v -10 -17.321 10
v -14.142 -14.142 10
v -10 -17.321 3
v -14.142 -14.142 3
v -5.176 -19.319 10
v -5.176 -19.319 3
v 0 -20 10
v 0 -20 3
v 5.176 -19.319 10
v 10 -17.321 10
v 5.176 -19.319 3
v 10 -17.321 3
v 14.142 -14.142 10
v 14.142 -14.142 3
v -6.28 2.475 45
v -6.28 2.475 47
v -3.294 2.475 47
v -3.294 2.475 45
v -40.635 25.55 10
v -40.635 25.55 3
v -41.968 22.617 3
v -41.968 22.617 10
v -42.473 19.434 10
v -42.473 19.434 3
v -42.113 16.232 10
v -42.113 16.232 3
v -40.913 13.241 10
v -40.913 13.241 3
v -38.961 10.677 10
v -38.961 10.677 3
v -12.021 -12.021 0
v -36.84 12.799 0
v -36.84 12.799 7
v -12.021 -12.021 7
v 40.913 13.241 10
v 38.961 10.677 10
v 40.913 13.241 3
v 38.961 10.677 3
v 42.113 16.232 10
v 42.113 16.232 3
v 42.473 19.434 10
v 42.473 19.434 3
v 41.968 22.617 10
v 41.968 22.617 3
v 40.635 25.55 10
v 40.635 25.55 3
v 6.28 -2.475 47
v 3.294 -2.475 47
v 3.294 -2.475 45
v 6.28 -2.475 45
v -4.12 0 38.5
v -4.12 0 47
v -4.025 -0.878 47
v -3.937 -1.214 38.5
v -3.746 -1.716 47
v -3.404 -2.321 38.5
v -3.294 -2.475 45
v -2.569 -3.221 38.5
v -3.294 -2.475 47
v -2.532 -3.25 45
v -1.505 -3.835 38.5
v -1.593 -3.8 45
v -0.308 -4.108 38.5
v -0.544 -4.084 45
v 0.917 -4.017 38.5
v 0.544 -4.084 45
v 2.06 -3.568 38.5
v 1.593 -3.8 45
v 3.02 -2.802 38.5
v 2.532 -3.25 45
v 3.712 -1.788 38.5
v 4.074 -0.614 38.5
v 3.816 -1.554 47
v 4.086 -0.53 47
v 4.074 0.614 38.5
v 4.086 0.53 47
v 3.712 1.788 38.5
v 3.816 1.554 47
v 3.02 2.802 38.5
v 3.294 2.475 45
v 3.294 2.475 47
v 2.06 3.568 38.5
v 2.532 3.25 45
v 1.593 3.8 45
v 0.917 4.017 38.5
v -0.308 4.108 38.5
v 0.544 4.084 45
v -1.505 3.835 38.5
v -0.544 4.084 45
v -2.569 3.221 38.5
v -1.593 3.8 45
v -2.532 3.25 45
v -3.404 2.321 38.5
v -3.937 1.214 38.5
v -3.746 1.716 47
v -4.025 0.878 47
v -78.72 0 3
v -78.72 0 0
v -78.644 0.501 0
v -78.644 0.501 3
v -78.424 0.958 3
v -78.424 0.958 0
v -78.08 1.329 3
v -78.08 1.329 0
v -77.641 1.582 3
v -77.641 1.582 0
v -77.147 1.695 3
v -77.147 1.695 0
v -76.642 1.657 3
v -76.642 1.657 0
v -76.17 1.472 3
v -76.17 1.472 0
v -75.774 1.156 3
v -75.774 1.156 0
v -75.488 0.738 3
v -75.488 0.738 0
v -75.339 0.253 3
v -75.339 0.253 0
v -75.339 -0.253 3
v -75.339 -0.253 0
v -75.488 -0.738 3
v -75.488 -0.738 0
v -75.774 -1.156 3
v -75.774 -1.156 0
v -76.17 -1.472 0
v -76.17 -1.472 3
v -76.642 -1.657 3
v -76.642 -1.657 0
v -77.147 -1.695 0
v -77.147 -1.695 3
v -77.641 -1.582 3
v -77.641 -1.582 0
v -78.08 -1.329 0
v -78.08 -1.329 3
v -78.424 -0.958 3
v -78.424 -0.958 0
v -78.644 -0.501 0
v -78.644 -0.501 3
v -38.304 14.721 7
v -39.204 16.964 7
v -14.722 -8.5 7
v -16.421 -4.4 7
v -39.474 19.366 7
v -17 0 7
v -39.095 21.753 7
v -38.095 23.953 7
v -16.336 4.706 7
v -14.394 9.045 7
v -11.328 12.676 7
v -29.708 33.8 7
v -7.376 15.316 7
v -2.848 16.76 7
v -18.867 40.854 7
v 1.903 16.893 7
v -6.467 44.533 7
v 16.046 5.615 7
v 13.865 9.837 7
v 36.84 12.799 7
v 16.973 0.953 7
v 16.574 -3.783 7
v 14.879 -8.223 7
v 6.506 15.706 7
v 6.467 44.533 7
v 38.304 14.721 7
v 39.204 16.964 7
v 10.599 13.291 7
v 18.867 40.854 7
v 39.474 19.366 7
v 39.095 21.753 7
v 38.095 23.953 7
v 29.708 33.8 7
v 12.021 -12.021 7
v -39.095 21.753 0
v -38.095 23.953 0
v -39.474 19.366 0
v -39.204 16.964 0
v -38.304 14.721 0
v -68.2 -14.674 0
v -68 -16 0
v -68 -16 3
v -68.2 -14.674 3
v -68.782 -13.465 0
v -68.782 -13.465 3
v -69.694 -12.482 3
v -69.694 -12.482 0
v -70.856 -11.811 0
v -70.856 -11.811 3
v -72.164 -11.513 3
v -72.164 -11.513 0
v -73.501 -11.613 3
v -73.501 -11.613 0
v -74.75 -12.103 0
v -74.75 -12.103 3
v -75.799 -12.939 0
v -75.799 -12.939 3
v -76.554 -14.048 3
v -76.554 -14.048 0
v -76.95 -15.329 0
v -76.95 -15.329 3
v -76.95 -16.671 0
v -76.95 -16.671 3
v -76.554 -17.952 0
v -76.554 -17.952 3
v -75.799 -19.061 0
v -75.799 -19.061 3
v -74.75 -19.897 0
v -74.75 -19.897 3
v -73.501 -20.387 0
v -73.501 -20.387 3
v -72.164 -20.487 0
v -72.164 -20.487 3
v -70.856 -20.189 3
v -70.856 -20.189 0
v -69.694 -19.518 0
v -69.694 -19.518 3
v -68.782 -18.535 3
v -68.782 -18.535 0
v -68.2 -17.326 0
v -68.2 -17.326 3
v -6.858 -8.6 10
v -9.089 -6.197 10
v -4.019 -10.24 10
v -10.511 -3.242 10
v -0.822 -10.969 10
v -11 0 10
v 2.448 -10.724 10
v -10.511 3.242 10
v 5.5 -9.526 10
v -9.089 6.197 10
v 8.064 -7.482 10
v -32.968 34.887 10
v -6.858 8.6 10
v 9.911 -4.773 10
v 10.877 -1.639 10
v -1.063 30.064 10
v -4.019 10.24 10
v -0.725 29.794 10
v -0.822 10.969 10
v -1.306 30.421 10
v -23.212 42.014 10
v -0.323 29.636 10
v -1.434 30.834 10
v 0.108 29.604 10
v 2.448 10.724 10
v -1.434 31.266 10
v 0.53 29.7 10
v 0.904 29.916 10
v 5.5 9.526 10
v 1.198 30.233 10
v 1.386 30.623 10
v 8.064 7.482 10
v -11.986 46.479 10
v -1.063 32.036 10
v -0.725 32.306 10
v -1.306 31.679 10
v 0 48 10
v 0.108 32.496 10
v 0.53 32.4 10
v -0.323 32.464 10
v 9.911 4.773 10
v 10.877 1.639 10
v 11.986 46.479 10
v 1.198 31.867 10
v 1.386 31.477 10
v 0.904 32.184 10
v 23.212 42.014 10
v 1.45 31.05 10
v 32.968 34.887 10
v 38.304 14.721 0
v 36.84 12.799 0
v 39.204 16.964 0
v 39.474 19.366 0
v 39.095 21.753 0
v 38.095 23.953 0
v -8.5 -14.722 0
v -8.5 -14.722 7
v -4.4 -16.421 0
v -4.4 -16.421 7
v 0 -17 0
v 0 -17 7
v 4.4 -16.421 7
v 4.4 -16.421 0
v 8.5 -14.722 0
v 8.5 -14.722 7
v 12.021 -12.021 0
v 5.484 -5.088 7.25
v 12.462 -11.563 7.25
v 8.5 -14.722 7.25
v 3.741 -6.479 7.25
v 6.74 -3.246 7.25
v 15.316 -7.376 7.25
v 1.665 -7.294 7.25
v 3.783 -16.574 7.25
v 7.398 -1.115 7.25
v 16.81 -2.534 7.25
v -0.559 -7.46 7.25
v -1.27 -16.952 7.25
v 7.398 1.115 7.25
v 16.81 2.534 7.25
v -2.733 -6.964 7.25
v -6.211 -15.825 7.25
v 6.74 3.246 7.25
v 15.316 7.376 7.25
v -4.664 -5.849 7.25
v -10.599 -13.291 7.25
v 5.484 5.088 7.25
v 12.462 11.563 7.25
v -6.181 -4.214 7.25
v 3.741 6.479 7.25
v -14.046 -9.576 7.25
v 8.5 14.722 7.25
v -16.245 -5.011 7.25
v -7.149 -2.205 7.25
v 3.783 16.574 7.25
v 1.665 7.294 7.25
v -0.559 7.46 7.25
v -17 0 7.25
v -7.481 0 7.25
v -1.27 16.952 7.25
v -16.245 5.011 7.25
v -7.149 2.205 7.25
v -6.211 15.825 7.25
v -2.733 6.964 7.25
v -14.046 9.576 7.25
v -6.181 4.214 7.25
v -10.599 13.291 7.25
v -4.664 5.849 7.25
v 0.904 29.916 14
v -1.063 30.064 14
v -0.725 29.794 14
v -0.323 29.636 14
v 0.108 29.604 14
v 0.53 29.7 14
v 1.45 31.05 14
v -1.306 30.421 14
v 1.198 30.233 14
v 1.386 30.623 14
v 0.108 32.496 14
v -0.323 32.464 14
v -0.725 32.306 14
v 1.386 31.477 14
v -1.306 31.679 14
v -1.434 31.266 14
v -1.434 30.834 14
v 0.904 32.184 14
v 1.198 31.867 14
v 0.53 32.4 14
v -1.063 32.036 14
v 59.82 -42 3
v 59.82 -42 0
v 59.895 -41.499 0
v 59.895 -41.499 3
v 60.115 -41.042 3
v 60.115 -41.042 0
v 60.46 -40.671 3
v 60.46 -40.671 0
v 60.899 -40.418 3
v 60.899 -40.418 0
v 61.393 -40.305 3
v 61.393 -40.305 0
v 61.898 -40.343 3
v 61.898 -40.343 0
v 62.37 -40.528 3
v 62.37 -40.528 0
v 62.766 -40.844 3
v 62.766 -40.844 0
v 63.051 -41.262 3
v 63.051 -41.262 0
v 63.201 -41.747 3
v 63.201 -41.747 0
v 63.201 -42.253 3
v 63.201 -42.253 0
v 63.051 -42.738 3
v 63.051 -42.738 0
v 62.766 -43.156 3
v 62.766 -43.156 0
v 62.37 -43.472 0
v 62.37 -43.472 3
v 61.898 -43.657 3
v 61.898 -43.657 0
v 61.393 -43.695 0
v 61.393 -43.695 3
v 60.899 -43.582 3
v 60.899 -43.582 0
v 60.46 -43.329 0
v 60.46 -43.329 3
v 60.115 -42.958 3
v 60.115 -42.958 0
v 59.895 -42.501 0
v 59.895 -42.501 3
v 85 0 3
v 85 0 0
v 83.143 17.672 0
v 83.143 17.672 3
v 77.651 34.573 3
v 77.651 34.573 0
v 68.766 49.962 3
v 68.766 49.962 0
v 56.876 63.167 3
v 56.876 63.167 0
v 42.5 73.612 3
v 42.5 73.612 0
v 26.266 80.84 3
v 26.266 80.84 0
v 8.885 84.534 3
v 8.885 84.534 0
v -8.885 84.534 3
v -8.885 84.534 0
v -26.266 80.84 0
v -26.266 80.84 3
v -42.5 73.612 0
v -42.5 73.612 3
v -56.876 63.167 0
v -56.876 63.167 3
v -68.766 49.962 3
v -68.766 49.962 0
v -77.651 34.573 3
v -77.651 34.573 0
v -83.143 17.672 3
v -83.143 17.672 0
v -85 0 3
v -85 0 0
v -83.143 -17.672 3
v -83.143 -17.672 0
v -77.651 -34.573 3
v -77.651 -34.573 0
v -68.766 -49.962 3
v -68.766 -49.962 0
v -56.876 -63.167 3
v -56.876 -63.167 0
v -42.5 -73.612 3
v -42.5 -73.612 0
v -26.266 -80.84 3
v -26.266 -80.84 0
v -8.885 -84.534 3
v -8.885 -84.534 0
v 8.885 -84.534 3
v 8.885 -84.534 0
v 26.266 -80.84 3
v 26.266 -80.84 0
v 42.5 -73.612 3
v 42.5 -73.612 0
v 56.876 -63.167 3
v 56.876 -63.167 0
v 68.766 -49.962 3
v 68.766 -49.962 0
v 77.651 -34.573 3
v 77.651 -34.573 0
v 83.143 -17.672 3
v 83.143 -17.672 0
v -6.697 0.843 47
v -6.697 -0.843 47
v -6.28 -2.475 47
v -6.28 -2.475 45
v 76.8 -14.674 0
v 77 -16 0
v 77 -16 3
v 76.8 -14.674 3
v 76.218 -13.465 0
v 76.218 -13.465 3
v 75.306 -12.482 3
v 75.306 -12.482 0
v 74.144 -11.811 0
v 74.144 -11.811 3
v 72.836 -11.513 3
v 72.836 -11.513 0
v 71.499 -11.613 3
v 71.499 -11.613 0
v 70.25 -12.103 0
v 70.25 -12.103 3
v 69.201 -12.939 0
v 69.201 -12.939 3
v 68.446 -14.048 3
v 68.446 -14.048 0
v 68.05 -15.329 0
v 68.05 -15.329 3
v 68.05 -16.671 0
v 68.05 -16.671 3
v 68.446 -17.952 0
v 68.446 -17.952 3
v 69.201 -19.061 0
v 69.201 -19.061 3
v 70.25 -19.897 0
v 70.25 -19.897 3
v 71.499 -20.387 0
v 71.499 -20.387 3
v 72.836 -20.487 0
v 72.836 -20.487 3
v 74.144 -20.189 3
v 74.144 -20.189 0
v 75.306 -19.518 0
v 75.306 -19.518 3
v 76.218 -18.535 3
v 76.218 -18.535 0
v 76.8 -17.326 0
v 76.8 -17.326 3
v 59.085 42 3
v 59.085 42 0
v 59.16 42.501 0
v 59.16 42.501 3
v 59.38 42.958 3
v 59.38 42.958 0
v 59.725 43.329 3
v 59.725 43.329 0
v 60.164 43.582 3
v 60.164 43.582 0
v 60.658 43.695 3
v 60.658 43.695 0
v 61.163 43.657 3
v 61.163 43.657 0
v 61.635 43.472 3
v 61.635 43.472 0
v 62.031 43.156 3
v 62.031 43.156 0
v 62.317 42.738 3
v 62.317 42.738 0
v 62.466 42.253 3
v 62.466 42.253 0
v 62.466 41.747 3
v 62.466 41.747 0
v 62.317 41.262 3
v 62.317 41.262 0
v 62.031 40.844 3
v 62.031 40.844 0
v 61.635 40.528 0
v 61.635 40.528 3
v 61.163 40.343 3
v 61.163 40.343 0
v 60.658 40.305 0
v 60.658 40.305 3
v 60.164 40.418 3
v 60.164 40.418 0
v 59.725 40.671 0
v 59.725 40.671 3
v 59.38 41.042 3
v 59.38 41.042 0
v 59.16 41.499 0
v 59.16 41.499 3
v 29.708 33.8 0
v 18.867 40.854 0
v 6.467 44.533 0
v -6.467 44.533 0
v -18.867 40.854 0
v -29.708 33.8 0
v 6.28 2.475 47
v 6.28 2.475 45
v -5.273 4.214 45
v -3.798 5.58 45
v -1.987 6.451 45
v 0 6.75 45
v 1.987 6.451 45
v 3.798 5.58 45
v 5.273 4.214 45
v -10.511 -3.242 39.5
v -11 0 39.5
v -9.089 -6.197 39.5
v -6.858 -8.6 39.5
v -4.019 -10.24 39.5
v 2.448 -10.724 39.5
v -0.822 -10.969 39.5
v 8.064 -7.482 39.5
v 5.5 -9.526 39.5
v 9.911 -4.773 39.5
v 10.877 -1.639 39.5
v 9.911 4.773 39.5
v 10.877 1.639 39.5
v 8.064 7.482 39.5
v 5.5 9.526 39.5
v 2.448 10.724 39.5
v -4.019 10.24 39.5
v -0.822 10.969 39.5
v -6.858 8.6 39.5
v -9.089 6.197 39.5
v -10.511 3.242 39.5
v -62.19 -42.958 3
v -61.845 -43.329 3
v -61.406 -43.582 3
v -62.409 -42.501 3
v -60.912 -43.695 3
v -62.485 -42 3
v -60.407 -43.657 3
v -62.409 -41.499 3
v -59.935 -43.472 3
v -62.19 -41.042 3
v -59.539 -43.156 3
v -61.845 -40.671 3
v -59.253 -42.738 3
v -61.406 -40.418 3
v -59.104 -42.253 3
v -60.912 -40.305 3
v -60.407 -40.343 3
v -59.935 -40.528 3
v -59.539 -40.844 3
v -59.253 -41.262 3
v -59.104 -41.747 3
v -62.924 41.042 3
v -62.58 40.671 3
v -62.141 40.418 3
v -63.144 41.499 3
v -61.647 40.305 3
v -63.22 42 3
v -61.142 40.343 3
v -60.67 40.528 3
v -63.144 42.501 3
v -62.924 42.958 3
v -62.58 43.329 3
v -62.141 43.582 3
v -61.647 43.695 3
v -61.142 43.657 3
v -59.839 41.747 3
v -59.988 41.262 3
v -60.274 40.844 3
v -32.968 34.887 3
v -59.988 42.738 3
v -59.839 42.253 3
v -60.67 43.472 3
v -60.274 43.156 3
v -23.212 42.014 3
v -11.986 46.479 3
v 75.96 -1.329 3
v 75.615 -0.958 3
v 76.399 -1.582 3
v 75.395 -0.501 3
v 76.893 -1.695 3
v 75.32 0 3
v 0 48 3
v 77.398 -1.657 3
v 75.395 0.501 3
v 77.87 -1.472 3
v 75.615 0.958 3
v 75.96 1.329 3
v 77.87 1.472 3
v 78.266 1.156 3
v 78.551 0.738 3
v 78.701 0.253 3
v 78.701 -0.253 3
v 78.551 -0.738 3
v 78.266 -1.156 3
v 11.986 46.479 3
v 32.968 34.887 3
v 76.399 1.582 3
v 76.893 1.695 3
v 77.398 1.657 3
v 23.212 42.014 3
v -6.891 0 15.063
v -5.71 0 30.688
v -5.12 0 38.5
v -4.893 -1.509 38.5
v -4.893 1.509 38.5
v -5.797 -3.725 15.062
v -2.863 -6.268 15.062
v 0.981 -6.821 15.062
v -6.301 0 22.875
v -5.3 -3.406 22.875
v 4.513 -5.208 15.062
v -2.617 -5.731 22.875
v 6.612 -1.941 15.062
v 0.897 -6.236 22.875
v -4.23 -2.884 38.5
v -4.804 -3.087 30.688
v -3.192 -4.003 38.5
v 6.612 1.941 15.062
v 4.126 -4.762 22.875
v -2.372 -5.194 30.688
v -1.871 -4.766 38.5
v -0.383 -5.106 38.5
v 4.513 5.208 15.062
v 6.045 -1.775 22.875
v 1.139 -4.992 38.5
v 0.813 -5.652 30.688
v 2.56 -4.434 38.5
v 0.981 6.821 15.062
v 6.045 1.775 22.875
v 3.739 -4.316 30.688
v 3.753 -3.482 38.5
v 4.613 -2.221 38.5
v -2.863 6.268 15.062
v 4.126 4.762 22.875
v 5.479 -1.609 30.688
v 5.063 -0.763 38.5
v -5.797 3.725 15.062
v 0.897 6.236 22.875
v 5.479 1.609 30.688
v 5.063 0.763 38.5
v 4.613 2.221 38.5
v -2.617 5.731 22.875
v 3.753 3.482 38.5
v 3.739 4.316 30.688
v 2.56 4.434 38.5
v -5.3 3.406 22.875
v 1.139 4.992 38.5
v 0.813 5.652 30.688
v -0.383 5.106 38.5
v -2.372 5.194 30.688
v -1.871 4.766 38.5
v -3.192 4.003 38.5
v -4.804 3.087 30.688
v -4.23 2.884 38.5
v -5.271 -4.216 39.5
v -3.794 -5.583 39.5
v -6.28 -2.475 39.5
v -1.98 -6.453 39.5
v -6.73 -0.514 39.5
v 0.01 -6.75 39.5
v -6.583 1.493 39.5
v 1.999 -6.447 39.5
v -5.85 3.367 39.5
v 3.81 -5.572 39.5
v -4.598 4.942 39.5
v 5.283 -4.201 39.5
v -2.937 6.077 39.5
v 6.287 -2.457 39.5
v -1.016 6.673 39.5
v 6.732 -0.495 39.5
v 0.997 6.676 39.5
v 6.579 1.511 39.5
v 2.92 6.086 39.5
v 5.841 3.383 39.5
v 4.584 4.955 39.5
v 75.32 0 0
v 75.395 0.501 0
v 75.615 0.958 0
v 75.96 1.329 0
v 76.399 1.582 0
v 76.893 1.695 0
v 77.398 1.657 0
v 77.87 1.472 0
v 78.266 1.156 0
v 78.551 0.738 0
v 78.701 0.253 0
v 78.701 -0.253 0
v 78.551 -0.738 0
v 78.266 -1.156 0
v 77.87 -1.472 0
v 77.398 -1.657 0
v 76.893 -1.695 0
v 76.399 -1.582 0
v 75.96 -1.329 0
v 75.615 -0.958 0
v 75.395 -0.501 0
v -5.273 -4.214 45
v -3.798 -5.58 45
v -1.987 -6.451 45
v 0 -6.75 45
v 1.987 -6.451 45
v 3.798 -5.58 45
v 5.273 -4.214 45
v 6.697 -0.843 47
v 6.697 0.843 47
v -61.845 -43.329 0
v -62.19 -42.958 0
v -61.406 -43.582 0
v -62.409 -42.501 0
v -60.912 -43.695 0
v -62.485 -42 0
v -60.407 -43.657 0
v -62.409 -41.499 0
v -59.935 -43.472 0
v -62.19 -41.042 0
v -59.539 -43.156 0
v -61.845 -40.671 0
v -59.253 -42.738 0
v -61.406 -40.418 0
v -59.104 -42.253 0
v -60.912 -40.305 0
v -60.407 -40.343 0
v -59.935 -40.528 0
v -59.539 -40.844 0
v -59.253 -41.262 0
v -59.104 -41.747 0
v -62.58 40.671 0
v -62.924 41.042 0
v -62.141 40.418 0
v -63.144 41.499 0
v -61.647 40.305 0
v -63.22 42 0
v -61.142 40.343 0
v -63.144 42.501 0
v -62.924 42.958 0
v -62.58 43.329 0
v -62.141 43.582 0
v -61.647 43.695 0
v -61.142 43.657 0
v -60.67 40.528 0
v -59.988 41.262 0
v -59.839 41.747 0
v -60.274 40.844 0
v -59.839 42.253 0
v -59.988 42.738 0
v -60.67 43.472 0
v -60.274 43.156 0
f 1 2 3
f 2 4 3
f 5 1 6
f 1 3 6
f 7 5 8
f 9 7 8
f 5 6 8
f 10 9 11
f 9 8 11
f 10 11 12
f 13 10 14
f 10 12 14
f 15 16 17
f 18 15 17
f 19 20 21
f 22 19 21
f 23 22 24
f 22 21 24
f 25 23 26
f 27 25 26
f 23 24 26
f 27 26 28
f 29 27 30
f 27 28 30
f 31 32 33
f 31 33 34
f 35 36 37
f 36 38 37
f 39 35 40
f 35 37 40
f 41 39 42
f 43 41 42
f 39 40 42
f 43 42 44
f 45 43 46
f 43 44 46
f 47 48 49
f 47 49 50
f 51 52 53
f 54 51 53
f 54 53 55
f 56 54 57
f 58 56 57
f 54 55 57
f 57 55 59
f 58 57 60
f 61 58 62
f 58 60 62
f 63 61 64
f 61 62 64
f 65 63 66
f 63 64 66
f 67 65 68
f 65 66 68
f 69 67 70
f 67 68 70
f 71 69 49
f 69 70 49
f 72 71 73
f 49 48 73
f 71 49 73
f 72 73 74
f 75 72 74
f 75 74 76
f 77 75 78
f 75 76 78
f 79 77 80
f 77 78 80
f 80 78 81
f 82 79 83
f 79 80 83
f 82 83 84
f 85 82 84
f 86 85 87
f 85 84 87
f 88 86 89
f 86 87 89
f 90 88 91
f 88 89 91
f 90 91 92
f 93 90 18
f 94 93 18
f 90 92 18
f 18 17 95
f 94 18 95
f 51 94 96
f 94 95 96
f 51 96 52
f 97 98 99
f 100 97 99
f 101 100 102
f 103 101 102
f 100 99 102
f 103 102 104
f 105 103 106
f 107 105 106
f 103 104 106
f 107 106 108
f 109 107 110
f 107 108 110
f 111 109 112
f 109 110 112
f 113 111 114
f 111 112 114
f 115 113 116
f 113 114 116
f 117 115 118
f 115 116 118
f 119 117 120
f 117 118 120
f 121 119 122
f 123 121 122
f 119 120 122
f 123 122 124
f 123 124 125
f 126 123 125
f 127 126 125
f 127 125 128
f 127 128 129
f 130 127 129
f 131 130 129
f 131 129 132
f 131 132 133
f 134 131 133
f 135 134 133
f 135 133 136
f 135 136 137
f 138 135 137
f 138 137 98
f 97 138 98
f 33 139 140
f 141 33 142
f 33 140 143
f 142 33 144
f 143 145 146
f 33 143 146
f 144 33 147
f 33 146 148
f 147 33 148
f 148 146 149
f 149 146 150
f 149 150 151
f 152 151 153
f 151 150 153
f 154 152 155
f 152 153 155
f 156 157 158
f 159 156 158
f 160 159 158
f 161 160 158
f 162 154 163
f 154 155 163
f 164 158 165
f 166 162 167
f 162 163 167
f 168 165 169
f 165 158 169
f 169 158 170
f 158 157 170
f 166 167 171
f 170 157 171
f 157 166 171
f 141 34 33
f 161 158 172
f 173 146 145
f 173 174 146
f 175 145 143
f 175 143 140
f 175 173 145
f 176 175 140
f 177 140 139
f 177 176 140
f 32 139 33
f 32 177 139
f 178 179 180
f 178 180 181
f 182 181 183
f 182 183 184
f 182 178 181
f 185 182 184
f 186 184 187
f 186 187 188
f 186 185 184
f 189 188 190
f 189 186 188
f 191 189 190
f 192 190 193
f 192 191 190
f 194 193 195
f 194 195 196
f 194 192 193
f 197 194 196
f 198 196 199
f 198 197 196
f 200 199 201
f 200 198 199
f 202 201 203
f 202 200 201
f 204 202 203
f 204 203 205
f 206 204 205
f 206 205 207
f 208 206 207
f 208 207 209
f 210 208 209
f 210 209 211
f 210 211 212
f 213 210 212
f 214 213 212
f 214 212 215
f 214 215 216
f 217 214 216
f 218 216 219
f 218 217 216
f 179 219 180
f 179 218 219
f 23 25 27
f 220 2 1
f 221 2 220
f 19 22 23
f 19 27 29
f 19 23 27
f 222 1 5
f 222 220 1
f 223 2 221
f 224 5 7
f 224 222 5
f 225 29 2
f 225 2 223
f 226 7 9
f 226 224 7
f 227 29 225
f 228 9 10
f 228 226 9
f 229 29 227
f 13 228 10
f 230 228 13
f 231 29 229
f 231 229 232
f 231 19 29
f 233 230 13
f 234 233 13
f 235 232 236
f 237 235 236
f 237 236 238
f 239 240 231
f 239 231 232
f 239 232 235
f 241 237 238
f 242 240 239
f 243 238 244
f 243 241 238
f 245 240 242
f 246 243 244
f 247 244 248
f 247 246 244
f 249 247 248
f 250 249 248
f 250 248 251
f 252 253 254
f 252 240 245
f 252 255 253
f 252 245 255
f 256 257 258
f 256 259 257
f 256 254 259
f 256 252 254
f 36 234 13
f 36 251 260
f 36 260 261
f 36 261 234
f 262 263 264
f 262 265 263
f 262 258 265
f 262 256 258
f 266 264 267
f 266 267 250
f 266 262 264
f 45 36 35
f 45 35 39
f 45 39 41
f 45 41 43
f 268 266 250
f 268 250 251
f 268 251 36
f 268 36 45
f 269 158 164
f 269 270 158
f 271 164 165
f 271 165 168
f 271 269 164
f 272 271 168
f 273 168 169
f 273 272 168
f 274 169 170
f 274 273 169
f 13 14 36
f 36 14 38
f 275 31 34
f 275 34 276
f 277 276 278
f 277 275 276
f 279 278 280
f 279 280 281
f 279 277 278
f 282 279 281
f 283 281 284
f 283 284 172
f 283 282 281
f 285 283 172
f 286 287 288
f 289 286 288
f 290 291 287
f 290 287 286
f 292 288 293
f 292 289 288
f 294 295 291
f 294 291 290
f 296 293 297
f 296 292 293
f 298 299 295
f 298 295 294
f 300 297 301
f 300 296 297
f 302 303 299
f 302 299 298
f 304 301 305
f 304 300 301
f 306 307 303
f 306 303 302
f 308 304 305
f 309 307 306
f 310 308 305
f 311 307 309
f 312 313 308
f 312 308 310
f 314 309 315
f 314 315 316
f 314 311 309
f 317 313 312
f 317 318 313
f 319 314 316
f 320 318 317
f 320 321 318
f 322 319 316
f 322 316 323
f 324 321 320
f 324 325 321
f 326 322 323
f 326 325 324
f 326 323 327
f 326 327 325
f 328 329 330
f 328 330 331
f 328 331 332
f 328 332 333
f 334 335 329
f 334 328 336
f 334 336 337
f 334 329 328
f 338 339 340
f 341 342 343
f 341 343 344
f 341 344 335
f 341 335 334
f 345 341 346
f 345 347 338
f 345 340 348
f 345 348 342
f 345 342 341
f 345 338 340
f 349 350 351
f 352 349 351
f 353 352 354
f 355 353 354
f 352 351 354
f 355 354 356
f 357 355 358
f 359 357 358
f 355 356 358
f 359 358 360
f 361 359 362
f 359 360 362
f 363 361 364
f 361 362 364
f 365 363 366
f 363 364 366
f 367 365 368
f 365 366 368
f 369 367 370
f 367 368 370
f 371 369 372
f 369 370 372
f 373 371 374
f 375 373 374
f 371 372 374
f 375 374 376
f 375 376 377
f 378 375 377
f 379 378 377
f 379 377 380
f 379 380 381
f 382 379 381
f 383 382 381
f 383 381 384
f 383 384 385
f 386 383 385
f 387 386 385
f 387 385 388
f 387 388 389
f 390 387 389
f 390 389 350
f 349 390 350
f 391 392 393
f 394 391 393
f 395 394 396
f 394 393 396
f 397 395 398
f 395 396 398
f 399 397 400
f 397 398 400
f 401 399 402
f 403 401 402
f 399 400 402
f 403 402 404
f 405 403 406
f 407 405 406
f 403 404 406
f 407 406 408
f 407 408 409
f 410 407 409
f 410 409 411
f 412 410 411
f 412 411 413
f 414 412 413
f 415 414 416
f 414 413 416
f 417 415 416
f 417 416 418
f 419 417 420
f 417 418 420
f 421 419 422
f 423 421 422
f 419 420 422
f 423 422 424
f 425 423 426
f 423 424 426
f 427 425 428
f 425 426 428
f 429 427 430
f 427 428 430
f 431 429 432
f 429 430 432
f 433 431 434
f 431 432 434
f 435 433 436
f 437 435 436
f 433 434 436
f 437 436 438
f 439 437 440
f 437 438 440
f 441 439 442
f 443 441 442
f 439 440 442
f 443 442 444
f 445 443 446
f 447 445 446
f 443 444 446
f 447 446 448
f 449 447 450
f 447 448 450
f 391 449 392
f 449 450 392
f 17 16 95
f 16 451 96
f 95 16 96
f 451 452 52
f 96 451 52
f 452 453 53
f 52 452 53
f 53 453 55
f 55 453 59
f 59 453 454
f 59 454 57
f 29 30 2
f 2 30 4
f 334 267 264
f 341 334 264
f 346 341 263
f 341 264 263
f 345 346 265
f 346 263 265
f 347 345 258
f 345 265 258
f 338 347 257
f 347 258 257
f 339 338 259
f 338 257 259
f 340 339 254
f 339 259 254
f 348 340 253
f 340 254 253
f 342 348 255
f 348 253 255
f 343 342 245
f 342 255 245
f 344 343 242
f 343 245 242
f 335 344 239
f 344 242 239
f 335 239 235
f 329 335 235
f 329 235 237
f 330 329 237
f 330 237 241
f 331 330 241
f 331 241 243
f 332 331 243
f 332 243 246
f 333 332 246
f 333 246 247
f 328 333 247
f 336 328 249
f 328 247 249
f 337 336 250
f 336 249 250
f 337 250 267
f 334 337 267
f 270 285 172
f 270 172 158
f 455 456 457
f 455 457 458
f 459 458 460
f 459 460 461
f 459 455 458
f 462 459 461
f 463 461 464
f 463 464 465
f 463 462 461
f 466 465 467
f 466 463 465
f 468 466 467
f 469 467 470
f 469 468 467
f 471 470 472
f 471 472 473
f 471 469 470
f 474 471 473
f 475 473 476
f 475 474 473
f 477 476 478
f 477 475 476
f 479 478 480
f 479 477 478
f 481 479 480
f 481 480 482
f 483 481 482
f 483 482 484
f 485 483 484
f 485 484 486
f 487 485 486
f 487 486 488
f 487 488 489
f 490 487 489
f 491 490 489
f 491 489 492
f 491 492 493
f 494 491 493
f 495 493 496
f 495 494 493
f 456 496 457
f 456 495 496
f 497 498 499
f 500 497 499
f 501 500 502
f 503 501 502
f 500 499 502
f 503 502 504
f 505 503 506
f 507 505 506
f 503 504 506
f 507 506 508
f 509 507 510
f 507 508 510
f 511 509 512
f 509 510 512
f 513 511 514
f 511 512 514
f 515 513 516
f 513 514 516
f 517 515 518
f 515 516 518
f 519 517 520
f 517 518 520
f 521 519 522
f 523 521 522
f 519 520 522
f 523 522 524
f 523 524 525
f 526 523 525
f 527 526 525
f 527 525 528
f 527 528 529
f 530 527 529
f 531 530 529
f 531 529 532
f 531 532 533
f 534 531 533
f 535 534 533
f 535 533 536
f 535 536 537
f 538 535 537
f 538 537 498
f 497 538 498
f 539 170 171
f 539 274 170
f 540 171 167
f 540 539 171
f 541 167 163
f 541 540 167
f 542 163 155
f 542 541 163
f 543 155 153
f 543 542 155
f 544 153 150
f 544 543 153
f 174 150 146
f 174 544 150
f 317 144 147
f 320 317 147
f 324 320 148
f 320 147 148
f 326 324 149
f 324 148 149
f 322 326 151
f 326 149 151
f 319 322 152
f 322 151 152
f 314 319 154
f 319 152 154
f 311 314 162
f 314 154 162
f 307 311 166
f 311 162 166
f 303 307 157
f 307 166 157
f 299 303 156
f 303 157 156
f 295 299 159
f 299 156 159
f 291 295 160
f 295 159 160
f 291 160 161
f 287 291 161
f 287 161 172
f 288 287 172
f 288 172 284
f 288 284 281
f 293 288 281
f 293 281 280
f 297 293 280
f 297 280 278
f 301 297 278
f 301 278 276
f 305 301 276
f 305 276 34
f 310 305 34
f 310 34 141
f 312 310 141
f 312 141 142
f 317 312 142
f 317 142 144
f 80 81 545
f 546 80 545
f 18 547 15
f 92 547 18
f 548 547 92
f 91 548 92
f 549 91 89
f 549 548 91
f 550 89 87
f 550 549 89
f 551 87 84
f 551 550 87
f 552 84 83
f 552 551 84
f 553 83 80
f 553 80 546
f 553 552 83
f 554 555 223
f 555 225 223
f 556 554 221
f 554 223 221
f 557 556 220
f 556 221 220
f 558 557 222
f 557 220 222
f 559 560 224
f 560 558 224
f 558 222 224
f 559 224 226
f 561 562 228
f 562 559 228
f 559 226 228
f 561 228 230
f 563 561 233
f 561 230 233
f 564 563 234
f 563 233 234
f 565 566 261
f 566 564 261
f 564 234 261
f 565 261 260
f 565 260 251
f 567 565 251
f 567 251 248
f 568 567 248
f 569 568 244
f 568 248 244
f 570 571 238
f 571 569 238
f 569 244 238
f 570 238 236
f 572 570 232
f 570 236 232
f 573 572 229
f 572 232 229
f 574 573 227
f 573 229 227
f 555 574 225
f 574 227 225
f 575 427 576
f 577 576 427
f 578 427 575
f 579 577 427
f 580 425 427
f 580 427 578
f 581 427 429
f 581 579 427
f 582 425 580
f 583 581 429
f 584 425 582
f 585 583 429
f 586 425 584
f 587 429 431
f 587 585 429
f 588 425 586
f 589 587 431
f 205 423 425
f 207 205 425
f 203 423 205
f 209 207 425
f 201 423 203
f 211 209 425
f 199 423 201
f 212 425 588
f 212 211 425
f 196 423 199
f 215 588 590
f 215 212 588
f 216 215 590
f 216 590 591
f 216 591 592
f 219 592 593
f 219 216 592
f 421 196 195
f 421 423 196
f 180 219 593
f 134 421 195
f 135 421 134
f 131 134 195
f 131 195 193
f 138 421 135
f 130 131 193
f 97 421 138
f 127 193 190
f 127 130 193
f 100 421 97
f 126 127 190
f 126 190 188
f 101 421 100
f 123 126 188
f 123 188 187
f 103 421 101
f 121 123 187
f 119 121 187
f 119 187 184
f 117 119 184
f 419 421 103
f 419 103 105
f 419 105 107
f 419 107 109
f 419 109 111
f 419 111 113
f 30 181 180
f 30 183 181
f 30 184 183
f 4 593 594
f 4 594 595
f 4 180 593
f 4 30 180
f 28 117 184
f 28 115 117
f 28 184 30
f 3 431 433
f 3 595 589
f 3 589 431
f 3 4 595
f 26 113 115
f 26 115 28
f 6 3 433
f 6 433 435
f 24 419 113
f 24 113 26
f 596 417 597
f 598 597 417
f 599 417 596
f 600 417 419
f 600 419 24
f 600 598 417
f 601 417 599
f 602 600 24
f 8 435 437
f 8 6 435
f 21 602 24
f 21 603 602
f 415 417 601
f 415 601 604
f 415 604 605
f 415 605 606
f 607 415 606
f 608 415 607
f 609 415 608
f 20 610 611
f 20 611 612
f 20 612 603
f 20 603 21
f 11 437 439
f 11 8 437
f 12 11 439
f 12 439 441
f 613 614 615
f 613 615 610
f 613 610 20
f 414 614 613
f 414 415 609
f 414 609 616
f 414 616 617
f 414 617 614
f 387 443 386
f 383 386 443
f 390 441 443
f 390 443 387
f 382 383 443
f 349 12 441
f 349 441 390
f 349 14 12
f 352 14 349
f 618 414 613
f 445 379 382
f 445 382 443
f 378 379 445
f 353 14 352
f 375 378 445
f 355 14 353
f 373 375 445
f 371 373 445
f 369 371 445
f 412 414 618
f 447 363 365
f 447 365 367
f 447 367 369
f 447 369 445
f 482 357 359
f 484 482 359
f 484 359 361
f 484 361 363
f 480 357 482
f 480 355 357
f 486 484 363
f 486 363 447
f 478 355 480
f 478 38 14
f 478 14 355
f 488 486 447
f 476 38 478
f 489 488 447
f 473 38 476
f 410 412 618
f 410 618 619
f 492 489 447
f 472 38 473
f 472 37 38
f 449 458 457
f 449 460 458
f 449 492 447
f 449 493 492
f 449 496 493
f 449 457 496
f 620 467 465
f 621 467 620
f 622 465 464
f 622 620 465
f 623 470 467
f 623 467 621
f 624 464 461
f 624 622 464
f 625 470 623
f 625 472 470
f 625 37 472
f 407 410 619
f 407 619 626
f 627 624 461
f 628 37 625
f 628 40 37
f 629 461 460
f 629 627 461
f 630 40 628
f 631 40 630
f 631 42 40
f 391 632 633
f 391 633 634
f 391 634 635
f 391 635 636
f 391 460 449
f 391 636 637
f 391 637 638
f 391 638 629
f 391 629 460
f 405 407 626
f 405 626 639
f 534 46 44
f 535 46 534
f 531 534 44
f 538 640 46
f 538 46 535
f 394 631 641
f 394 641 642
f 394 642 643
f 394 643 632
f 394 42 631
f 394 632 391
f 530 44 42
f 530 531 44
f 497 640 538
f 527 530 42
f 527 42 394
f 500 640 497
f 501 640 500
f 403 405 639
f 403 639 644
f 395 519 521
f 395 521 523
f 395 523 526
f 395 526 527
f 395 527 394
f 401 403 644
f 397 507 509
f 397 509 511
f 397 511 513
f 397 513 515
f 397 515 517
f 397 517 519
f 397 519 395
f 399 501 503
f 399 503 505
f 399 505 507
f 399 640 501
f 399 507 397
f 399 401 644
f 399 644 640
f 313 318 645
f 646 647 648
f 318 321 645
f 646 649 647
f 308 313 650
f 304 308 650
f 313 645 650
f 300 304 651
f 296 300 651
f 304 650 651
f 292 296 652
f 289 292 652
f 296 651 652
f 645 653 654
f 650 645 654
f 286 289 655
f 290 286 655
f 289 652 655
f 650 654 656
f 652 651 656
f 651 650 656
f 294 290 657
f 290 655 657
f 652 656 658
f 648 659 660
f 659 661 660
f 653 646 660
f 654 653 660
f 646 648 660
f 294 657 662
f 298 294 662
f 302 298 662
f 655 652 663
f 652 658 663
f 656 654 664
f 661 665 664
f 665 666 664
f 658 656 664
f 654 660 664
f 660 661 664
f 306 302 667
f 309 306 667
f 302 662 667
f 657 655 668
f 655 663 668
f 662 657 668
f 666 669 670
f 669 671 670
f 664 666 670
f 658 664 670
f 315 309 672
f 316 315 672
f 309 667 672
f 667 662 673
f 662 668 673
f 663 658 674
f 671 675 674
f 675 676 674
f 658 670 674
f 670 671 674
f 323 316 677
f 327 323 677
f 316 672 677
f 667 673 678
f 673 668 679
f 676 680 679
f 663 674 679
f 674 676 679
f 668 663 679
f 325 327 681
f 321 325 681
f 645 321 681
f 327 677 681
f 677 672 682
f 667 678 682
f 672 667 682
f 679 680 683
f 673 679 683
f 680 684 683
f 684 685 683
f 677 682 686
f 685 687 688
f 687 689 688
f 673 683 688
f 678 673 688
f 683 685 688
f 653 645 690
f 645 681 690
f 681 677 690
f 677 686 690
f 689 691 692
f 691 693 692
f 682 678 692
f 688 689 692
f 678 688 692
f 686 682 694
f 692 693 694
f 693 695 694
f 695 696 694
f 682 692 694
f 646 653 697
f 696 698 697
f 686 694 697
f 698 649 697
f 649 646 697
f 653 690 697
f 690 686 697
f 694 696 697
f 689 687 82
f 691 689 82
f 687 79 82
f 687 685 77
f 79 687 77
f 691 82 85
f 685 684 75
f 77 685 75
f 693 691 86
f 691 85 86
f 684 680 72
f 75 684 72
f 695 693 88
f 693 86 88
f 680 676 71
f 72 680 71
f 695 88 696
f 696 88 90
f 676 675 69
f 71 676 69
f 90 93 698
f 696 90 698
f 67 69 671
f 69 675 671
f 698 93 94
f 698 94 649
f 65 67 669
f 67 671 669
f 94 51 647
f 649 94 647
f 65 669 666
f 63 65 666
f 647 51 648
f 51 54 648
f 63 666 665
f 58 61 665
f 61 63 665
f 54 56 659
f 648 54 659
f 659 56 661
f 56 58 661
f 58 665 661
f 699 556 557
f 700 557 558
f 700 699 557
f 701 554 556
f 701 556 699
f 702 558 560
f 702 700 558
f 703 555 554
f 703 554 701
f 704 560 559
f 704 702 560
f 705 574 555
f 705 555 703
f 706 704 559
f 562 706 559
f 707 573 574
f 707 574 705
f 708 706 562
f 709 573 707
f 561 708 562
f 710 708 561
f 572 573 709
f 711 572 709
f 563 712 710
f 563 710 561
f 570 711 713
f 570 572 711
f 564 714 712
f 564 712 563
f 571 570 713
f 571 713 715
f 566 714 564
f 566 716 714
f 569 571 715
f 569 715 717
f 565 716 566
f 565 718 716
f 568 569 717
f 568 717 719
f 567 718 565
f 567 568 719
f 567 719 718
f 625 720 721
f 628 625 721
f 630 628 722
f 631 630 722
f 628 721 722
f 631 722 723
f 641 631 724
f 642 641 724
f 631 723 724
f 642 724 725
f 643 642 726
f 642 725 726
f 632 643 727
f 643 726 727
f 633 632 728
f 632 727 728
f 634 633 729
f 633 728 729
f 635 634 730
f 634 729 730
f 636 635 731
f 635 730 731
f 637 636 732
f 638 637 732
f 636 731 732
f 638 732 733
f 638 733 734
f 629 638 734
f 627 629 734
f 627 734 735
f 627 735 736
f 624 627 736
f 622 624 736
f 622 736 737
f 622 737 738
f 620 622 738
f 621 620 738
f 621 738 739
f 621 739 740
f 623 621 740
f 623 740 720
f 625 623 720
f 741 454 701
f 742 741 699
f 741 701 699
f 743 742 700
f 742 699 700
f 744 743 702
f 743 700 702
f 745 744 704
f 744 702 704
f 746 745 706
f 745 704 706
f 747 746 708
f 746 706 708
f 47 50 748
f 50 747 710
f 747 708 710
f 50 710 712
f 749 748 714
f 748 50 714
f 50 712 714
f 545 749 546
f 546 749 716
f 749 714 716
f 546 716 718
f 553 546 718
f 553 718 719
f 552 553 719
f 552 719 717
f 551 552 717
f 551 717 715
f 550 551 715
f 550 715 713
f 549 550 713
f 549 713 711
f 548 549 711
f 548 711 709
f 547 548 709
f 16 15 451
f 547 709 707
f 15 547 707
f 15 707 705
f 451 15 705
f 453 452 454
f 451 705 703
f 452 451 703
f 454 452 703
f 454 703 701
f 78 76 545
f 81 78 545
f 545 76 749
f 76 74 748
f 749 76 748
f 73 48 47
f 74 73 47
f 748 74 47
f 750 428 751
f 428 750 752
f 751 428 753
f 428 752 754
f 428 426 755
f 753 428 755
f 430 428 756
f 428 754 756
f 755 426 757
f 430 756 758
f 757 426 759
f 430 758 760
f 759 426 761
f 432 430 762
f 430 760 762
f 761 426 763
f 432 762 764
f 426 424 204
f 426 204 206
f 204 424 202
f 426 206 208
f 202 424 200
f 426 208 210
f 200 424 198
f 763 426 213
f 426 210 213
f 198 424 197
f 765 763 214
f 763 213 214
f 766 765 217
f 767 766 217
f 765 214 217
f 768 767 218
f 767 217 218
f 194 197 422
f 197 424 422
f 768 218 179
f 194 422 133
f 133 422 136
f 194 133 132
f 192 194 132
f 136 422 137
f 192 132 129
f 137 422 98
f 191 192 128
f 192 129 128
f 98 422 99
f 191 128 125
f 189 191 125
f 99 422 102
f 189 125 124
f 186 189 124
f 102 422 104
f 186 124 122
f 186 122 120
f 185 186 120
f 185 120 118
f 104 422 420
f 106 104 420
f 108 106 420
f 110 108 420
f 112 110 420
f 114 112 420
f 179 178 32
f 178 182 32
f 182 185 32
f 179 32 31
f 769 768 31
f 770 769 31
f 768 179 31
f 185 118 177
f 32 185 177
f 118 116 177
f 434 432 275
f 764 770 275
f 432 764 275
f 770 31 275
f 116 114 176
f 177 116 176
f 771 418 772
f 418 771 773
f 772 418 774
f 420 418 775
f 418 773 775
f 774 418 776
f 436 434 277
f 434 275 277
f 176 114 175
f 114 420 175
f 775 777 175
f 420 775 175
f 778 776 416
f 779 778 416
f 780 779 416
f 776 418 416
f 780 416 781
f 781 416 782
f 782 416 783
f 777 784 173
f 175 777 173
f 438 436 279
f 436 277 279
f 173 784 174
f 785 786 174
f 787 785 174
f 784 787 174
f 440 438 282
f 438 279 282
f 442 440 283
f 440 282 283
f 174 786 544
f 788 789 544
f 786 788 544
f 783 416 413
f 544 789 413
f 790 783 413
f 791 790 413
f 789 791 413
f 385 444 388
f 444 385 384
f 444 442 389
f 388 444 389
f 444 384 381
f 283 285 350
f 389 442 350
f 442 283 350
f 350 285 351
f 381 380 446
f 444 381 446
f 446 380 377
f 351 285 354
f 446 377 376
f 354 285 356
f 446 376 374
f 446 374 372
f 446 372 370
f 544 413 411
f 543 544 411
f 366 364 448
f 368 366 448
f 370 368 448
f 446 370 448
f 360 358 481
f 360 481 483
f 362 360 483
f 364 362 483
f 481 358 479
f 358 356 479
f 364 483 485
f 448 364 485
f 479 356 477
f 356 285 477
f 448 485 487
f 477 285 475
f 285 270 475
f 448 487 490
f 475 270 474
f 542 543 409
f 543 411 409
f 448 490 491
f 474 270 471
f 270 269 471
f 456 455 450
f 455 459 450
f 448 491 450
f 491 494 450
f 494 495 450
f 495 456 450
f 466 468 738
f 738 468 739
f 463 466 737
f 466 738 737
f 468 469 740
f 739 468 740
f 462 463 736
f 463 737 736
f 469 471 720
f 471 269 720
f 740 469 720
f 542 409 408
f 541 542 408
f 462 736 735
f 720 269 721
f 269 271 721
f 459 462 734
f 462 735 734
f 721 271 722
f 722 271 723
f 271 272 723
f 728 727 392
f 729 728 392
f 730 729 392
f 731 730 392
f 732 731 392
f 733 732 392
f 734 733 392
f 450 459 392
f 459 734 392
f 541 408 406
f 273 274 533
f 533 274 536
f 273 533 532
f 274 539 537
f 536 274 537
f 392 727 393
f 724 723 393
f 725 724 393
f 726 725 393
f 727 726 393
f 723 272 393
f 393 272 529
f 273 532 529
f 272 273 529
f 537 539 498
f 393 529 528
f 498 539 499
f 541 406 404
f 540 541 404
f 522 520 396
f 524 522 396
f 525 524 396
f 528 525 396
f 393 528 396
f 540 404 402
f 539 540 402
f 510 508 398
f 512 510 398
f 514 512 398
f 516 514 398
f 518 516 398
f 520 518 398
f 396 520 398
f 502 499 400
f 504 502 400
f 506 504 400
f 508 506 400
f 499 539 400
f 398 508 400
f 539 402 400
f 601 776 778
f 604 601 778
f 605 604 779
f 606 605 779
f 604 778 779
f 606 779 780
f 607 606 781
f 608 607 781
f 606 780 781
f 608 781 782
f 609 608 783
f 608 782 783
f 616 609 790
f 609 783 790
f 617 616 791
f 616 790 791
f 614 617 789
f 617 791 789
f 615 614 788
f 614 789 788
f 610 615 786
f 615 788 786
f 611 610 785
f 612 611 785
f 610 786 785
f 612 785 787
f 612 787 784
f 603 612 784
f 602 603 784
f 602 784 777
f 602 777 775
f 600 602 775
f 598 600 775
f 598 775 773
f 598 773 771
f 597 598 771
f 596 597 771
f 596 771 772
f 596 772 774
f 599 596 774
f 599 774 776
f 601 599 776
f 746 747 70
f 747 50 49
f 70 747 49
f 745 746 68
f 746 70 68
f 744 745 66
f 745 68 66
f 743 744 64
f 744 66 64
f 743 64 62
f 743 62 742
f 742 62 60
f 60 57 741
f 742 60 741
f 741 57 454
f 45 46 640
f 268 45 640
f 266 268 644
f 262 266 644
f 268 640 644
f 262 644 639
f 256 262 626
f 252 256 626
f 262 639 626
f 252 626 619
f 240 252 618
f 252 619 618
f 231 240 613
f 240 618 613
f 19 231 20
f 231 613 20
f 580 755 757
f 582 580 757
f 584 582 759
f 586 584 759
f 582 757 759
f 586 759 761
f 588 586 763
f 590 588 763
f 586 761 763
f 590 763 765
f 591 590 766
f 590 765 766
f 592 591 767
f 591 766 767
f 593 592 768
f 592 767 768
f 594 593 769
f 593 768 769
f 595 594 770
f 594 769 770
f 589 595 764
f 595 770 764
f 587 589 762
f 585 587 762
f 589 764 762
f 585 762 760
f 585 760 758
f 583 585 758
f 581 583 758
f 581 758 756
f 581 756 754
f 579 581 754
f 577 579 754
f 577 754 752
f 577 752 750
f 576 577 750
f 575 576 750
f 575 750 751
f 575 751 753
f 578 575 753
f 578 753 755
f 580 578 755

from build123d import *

# Parameters (mm, degrees)
ESQUISSE1_R                  = 85
ESQUISSE1_R_2                = 7.5
ESQUISSE1_R_3                = 4.5
BOSS_EXTRU_1_DEPTH           = 3
BOSS_EXTRU_2_DEPTH           = 4
BOSS_EXTRU_3_DEPTH           = 3
ESQUISSE5_R                  = 7.5
ENL_V_MAT_EXTRU_2_DEPTH      = 3
ENL_V_START                  = -3
ENL_V_MAT_EXTRU_3_DEPTH      = 3
ENL_V_MAT_EXTRU_6_DEPTH      = 2
ESQUISSE9_R                  = 17
ENL_V_MAT_EXTRU_4_DEPTH      = 0.25
ENL_V_MAT_EXTRU_5_DEPTH      = 10
ENL_V_MAT_EXTRU_5_DEPTH_BACK = 7.5
ESQUISSE10_OUTSIDE_W         = 220.994
ESQUISSE10_OUTSIDE_H         = 220.994
ESQUISSE10_OUTSIDE_R         = 6.75
ESQUISSE11_R                 = 1.45
BOSS_EXTRU_4_DEPTH           = 4
D_GAGEMENT_M31_D             = 3.4


with BuildPart() as part:
    # Esquisse1 → Boss.-Extru.1 (new body)
    with BuildSketch(Plane.XY):
        Circle(ESQUISSE1_R)
        Circle(ESQUISSE1_R_2, mode=Mode.SUBTRACT)
        with Locations((-72.5, -16)):
            Circle(ESQUISSE1_R_3, mode=Mode.SUBTRACT)
        with Locations((72.5, -16)):
            Circle(ESQUISSE1_R_3, mode=Mode.SUBTRACT)
    extrude(amount=BOSS_EXTRU_1_DEPTH)

    # Esquisse3 → Boss.-Extru.2 (add)
    with BuildSketch(Plane.XY.offset(3)):
        with BuildLine():
            Line((14.142135624, -14.142135624), (38.961482916, 10.677211668))
            ThreePointArc((38.961482916, 10.677211668), (42.400953744, 17.820746084), (40.634935389, 25.549990723))
            ThreePointArc((40.634935389, 25.549990723), (0, 48), (-40.634935389, 25.549990723))
            ThreePointArc((-40.634935389, 25.549990723), (-42.400953744, 17.820746084), (-38.961482916, 10.677211668))
            Line((-38.961482916, 10.677211668), (-14.142135624, -14.142135624))
            ThreePointArc((-14.142135624, -14.142135624), (0, -20), (14.142135624, -14.142135624))
        make_face()
        with BuildLine():
            Line((-36.840162572, 12.798532012), (-12.02081528, -12.02081528))
            ThreePointArc((-12.02081528, -12.02081528), (0, -17), (12.02081528, -12.02081528))
            Line((12.02081528, -12.02081528), (36.840162572, 12.798532012))
            ThreePointArc((36.840162572, 12.798532012), (39.419765694, 18.156182824), (38.095251927, 23.953116303))
            ThreePointArc((38.095251927, 23.953116303), (0, 45), (-38.095251927, 23.953116303))
            ThreePointArc((-38.095251927, 23.953116303), (-39.419765694, 18.156182824), (-36.840162572, 12.798532012))
        make_face(mode=Mode.SUBTRACT)
    extrude(amount=BOSS_EXTRU_2_DEPTH)

    # Esquisse4 → Boss.-Extru.3 (add)
    with BuildSketch(Plane.XY.offset(7)):
        with BuildLine():
            Line((-38.961482916, 10.677211668), (-14.142135624, -14.142135624))
            ThreePointArc((-14.142135624, -14.142135624), (0, -20), (14.142135624, -14.142135624))
            Line((14.142135624, -14.142135624), (38.961482916, 10.677211668))
            ThreePointArc((38.961482916, 10.677211668), (42.400953744, 17.820746084), (40.634935389, 25.549990723))
            ThreePointArc((40.634935389, 25.549990723), (0, 48), (-40.634935389, 25.549990723))
            ThreePointArc((-40.634935389, 25.549990723), (-42.400953744, 17.820746084), (-38.961482916, 10.677211668))
        make_face()
    extrude(amount=BOSS_EXTRU_3_DEPTH)

    # Esquisse5 → Enlèv. mat.-Extru.2 (cut)
    with BuildSketch(Plane(origin=(0, 0, 7), x_dir=(-1, 0, 0), z_dir=(0, 0, -1))):
        Circle(ESQUISSE5_R)
    extrude(amount=-ENL_V_MAT_EXTRU_2_DEPTH, mode=Mode.SUBTRACT)

    # Esquisse6 → Enlèv. mat.-Extru.3 (cut)
    with BuildSketch(Plane.XY.offset(3).offset(ENL_V_START)):
        with BuildLine():
            Line((-36.840162572, 12.798532012), (-12.02081528, -12.02081528))
            ThreePointArc((-12.02081528, -12.02081528), (0, -17), (12.02081528, -12.02081528))
            Line((12.02081528, -12.02081528), (36.840162572, 12.798532012))
            ThreePointArc((36.840162572, 12.798532012), (39.419765694, 18.156182824), (38.095251927, 23.953116303))
            ThreePointArc((38.095251927, 23.953116303), (0, 45), (-38.095251927, 23.953116303))
            ThreePointArc((-38.095251927, 23.953116303), (-39.419765694, 18.156182824), (-36.840162572, 12.798532012))
        make_face()
    extrude(amount=ENL_V_MAT_EXTRU_3_DEPTH, mode=Mode.SUBTRACT)

    # Esquisse7 → Révolution1 (revolve)
    with BuildSketch(Plane(origin=(0, 0, 0), x_dir=(0, 0, -1), z_dir=(1, 0, 0))):
        Polygon((-7, -7.5), (-38.5, -5.12), (-38.5, -4.12), (-47, -4.12), (-47, -11), (-7, -11), align=None)
    revolve(axis=Axis((0, 0, 0), (0, 0, 1)))

    # Esquisse8 → Enlèv. mat.-Extru.6 (cut)
    with BuildSketch(Plane.XY.offset(47)):
        with BuildLine():
            Line((3.293747865, 2.475), (10.717946398, 2.475))
            ThreePointArc((10.717946398, 2.475), (0, 11), (-10.717946398, 2.475))
            Line((-10.717946398, 2.475), (-3.293747865, 2.475))
            ThreePointArc((-3.293747865, 2.475), (0, 4.12), (3.293747865, 2.475))
        make_face()
        with BuildLine():
            Line((-10.717946398, -2.475), (-3.293747865, -2.475))
            ThreePointArc((-3.293747865, -2.475), (0, -4.12), (3.293747865, -2.475))
            Line((3.293747865, -2.475), (10.717946398, -2.475))
            ThreePointArc((10.717946398, -2.475), (0, -11), (-10.717946398, -2.475))
        make_face()
    extrude(amount=-ENL_V_MAT_EXTRU_6_DEPTH, mode=Mode.SUBTRACT)

    # Esquisse9 → Enlèv. mat.-Extru.4 (cut)
    with BuildSketch(Plane(origin=(0, 0, 7), x_dir=(-1, 0, 0), z_dir=(0, 0, -1))):
        Circle(ESQUISSE9_R)
    extrude(amount=-ENL_V_MAT_EXTRU_4_DEPTH, mode=Mode.SUBTRACT)

    # Esquisse10 outside → Enlèv. mat.-Extru.5 (cut, two sides: drawn at the far end of the back side and taken through both)
    with BuildSketch(Plane.XY.offset(47).offset(-ENL_V_MAT_EXTRU_5_DEPTH_BACK)):
        Rectangle(ESQUISSE10_OUTSIDE_W, ESQUISSE10_OUTSIDE_H)
        Circle(ESQUISSE10_OUTSIDE_R, mode=Mode.SUBTRACT)
    extrude(amount=ENL_V_MAT_EXTRU_5_DEPTH + ENL_V_MAT_EXTRU_5_DEPTH_BACK, mode=Mode.SUBTRACT)

    # Esquisse11 → Boss.-Extru.4 (add)
    with BuildSketch(Plane.XY.offset(10)):
        with Locations((0, 31.05)):
            Circle(ESQUISSE11_R)
    extrude(amount=BOSS_EXTRU_4_DEPTH)

    # Dégagement M31 (through all)
    with Locations(Plane.XY.offset(3)):
        with Locations((60.78495979, 42), (77.019852204, 0), (61.519852204, -42), (-60.78495979, -42), (-77.019852204, 0), (-61.519852204, 42)):
            Hole(D_GAGEMENT_M31_D / 2)


solid = part.part
